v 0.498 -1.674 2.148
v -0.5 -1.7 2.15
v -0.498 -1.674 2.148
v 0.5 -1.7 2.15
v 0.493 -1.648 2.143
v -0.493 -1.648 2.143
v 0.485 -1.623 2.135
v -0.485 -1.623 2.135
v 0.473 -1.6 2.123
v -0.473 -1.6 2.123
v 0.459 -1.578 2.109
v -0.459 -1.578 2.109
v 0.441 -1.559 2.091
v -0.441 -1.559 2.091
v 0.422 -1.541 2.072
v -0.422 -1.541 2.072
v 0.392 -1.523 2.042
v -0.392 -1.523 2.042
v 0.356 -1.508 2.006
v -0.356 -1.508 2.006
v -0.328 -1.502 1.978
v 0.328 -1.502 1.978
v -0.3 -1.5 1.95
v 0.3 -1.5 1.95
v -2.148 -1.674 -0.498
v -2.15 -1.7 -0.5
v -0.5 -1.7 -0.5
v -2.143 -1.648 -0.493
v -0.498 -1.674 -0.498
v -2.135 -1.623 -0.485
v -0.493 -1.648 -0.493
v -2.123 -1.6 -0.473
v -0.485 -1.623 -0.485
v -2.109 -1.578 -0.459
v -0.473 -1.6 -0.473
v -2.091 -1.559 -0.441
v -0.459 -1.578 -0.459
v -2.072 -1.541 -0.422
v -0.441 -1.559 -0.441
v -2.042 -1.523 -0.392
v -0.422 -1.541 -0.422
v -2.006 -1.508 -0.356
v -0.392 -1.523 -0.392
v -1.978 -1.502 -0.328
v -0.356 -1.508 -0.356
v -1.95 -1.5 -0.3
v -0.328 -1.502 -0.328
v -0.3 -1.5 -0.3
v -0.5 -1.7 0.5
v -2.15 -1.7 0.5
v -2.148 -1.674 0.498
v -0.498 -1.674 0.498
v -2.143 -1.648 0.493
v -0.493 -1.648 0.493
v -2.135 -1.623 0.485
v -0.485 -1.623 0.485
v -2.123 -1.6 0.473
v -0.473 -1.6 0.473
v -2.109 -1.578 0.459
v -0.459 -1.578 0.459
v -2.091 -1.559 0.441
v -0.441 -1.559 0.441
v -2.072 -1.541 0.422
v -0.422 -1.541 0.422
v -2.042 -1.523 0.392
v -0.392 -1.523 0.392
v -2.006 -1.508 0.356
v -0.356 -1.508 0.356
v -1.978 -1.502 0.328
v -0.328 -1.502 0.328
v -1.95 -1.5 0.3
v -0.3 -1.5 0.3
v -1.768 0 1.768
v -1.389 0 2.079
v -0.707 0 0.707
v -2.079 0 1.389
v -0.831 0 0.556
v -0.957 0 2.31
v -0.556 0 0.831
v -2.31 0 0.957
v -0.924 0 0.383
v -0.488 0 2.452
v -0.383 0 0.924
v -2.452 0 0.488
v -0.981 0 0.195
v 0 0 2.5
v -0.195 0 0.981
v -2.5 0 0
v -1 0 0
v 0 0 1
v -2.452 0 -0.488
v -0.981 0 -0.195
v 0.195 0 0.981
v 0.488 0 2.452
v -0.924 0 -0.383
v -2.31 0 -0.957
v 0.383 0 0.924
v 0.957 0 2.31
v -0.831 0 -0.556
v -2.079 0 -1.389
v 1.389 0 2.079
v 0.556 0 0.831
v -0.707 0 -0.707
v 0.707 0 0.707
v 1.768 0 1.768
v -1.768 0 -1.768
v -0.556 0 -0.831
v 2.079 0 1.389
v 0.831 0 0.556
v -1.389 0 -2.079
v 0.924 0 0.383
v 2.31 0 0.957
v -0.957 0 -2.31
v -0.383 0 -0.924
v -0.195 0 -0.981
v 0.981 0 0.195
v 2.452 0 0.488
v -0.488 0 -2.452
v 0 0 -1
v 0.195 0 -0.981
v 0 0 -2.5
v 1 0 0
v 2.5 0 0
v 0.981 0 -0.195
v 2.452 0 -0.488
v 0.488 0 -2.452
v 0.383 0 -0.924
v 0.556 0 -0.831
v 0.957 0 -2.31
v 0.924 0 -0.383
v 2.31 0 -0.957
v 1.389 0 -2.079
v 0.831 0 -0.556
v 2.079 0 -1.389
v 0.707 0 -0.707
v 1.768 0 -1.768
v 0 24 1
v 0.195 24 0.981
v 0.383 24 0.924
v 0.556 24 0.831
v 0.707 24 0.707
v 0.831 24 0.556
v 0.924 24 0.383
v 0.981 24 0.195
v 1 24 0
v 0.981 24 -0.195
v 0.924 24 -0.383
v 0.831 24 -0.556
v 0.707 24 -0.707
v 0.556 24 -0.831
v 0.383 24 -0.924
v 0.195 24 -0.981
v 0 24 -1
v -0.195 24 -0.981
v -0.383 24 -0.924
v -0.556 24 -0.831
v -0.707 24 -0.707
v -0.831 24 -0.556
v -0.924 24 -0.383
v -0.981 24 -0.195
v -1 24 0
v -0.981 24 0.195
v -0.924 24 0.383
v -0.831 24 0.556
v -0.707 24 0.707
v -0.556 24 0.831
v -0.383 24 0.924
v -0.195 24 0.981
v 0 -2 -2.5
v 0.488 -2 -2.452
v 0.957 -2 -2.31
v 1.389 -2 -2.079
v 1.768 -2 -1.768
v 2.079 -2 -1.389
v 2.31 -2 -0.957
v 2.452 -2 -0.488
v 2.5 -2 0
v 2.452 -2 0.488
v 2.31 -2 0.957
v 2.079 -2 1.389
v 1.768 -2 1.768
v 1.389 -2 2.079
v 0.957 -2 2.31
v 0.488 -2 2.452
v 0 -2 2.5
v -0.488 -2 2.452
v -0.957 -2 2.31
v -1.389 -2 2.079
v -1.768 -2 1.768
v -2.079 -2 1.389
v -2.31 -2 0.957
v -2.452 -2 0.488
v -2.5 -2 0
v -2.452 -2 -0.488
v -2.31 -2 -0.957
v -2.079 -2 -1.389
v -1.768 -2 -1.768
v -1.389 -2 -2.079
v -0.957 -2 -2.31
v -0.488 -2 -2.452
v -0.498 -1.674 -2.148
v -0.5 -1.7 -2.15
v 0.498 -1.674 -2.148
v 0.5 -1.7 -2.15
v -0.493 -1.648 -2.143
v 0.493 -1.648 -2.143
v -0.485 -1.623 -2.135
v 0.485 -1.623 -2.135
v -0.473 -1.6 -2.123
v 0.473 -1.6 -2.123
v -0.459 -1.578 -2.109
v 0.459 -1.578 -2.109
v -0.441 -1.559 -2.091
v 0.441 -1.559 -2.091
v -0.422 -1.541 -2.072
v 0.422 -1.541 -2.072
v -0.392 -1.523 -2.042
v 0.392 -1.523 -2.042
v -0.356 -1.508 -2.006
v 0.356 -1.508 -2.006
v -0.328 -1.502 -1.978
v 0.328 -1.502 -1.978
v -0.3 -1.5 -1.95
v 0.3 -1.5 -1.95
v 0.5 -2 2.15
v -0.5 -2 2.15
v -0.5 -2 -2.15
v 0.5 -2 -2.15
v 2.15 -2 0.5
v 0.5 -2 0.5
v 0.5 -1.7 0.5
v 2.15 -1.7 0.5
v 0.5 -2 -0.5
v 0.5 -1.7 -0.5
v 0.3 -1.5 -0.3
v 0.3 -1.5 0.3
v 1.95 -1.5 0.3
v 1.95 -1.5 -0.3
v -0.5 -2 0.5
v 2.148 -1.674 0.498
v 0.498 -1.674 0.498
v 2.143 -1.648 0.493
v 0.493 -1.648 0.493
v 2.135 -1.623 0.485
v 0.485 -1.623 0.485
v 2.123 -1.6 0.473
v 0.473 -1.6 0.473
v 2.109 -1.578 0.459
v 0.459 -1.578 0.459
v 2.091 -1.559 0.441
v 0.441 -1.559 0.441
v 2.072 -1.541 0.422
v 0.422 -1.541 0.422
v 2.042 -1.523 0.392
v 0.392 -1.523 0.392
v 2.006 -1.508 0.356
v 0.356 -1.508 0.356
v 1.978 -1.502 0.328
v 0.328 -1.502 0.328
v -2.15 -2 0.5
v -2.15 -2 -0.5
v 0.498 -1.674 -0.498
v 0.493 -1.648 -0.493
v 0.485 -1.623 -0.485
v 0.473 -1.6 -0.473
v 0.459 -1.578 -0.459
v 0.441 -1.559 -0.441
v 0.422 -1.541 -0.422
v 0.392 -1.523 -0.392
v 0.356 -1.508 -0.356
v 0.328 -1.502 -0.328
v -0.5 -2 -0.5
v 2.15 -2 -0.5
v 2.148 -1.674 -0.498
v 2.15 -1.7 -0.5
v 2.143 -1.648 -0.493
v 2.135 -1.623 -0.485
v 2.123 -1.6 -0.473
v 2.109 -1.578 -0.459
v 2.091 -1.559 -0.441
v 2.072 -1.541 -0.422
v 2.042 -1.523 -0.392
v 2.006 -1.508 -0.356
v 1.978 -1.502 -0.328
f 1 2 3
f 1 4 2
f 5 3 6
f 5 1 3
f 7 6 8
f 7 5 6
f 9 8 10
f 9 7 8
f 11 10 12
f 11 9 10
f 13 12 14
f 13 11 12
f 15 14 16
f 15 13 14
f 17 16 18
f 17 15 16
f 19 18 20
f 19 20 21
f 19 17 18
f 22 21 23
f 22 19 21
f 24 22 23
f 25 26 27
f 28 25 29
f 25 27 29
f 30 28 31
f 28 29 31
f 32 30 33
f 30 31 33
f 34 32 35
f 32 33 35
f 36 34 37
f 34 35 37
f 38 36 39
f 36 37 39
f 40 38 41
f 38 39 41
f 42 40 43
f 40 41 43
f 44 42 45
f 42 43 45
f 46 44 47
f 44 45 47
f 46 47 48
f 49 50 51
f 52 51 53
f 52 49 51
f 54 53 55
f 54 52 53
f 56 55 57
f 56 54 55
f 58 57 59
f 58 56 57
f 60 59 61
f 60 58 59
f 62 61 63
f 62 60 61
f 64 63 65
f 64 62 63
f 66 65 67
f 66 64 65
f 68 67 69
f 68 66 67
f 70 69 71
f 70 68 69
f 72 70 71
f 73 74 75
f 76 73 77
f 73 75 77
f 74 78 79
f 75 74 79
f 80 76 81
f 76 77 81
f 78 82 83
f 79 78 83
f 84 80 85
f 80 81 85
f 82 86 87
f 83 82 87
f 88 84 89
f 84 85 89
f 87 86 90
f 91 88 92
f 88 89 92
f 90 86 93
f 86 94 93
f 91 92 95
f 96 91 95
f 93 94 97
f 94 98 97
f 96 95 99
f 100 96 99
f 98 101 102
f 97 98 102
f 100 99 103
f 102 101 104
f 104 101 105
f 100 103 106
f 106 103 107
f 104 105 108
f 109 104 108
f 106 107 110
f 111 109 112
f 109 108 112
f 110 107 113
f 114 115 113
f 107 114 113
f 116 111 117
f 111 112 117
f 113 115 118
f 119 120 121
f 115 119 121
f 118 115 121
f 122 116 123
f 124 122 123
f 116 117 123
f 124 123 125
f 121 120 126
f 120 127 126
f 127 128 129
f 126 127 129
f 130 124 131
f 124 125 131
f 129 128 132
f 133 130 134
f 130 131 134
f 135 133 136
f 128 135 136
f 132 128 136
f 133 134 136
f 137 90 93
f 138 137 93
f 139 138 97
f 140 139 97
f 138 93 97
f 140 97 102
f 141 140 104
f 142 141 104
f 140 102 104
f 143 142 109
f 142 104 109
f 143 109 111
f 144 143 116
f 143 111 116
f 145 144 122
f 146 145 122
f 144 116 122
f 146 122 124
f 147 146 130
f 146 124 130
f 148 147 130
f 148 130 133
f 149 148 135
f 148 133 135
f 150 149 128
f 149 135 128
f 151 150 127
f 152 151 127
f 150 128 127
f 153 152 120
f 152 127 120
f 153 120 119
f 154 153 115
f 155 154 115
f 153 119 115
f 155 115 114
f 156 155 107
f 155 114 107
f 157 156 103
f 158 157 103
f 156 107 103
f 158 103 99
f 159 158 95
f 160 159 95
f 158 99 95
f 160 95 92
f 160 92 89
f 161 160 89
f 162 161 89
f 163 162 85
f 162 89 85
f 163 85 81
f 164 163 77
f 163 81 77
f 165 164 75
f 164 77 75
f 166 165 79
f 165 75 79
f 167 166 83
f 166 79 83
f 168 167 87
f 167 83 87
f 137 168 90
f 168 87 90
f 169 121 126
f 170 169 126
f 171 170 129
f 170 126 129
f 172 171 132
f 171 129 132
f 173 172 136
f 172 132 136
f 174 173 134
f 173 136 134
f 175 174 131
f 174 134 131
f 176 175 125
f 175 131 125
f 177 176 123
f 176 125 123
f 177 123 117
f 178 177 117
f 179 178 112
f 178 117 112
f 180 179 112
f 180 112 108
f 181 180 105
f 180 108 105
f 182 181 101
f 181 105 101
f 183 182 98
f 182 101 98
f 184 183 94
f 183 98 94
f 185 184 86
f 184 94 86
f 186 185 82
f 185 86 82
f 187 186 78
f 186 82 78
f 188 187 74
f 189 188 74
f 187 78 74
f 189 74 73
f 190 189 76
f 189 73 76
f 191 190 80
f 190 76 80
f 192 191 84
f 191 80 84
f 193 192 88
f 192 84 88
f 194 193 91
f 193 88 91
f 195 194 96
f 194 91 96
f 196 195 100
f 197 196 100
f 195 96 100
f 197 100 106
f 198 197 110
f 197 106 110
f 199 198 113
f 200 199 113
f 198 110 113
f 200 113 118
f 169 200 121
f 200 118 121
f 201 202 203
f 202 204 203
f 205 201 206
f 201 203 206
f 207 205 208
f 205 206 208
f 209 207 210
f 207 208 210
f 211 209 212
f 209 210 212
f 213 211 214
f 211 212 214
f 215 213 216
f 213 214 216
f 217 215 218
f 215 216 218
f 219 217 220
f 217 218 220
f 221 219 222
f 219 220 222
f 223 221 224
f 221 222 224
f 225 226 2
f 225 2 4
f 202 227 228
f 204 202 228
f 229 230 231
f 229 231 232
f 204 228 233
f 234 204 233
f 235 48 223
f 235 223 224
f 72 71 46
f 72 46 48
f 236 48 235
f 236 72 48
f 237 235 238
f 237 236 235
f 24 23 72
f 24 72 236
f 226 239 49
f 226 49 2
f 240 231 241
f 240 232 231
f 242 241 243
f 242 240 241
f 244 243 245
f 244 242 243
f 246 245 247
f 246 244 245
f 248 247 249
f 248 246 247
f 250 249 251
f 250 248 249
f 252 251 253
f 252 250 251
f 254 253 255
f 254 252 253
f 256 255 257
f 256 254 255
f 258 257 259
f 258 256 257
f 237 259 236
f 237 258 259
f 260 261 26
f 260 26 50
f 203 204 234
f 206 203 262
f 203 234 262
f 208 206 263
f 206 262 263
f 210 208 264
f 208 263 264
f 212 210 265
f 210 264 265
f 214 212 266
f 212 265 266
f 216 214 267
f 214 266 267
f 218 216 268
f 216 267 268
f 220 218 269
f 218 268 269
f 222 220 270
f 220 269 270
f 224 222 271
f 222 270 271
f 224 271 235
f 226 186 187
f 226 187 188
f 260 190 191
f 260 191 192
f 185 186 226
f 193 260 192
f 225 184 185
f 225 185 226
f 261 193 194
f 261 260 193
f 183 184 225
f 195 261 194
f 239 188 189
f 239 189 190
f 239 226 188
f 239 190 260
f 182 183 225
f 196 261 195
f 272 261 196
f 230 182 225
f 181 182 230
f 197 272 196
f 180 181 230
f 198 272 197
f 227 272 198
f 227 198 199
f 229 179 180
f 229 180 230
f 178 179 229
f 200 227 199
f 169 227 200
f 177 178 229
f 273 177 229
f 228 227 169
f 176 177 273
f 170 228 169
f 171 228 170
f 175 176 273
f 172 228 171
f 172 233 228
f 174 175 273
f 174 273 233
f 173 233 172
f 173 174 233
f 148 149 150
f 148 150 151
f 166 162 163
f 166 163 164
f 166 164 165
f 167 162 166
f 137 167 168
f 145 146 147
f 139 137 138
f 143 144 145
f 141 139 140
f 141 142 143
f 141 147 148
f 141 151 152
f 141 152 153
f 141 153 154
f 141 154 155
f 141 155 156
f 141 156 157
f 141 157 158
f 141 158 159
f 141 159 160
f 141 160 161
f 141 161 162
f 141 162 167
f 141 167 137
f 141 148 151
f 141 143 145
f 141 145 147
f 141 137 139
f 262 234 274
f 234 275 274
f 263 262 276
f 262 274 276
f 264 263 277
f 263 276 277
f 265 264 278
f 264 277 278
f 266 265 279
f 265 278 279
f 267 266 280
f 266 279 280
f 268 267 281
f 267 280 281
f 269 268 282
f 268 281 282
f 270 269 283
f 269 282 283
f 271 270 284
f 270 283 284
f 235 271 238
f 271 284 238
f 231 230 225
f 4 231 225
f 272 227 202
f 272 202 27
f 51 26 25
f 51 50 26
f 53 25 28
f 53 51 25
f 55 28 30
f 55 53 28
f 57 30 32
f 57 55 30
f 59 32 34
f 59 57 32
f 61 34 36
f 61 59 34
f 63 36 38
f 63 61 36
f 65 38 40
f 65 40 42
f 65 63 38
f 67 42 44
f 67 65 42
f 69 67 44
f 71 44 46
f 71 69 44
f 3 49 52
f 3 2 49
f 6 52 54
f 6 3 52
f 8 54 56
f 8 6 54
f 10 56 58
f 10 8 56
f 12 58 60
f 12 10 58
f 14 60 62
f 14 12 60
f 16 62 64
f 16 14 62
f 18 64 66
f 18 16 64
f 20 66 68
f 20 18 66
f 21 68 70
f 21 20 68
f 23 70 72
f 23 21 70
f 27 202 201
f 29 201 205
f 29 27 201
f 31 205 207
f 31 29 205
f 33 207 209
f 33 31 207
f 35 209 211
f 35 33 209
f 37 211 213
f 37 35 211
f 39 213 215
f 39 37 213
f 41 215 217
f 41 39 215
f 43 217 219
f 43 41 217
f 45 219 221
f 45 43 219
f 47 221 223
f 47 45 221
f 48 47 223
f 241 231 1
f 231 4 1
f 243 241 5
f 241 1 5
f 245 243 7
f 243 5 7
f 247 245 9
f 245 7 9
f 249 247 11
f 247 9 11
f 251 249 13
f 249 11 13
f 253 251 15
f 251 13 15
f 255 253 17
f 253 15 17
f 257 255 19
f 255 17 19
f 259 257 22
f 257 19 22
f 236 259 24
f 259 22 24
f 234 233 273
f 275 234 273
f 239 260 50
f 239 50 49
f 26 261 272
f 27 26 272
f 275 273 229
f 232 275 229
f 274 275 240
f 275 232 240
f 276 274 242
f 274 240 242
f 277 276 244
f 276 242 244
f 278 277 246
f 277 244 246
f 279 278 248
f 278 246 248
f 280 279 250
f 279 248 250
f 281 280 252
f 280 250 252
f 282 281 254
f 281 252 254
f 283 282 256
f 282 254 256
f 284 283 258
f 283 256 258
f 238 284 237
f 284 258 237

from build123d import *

# Parameters (mm, degrees)
SKETCH1_R           = 1
BOSS_EXTRUDE1_DEPTH = 24
SKETCH2_R           = 2.5
BOSS_EXTRUDE2_DEPTH = 2
SKETCH3_W           = 1.65
SKETCH3_H           = 1
SKETCH3_W_2         = 1
SKETCH3_H_2         = 1.65
CUT_EXTRUDE1_DEPTH  = 0.5
FILLET1_R           = 0.2


with BuildPart() as part:
    # Sketch1 → Boss-Extrude1 (new body)
    with BuildSketch(Plane(origin=(0, 0, 0), x_dir=(1, 0, 0), z_dir=(0, 1, 0))):
        with Locations(Location((0, 0, 0), (0, 0, 270))):
            Circle(SKETCH1_R)
    extrude(amount=BOSS_EXTRUDE1_DEPTH)

    # Sketch2 → Boss-Extrude2 (add)
    with BuildSketch(Plane.XZ):
        with Locations(Location((0, 0, 0), (0, 0, 270))):
            Circle(SKETCH2_R)
    extrude(amount=BOSS_EXTRUDE2_DEPTH)

    # Sketch3 → Cut-Extrude1 (cut)
    with BuildSketch(Plane.XZ.offset(2)):
        with Locations((1.325, 0)):
            Rectangle(SKETCH3_W, SKETCH3_H)
        with Locations((0, -1.325)):
            Rectangle(SKETCH3_W_2, SKETCH3_H_2)
        with Locations((-1.325, 0)):
            Rectangle(SKETCH3_W, SKETCH3_H)
        with Locations((0, 1.325)):
            Rectangle(SKETCH3_W_2, SKETCH3_H_2)
        Rectangle(SKETCH3_W_2, SKETCH3_H)
    extrude(amount=-CUT_EXTRUDE1_DEPTH, mode=Mode.SUBTRACT)

    # Fillet1
    fillet1_edges = [part.edges().sort_by_distance(p)[0] for p in [
        (1.325, -1.5, -0.5),
        (0.5, -1.5, -1.325),
        (0, -1.5, -2.15),
        (-1.325, -1.5, -0.5),
        (0.5, -1.5, 1.325),
        (2.15, -1.5, 0),
        (-0.5, -1.5, -1.325),
        (-2.15, -1.5, 0),
        (-1.325, -1.5, 0.5),
        (-0.5, -1.5, 1.325),
        (0, -1.5, 2.15),
        (1.325, -1.5, 0.5),
    ]]
    fillet(fillet1_edges, radius=FILLET1_R)


solid = part.part
